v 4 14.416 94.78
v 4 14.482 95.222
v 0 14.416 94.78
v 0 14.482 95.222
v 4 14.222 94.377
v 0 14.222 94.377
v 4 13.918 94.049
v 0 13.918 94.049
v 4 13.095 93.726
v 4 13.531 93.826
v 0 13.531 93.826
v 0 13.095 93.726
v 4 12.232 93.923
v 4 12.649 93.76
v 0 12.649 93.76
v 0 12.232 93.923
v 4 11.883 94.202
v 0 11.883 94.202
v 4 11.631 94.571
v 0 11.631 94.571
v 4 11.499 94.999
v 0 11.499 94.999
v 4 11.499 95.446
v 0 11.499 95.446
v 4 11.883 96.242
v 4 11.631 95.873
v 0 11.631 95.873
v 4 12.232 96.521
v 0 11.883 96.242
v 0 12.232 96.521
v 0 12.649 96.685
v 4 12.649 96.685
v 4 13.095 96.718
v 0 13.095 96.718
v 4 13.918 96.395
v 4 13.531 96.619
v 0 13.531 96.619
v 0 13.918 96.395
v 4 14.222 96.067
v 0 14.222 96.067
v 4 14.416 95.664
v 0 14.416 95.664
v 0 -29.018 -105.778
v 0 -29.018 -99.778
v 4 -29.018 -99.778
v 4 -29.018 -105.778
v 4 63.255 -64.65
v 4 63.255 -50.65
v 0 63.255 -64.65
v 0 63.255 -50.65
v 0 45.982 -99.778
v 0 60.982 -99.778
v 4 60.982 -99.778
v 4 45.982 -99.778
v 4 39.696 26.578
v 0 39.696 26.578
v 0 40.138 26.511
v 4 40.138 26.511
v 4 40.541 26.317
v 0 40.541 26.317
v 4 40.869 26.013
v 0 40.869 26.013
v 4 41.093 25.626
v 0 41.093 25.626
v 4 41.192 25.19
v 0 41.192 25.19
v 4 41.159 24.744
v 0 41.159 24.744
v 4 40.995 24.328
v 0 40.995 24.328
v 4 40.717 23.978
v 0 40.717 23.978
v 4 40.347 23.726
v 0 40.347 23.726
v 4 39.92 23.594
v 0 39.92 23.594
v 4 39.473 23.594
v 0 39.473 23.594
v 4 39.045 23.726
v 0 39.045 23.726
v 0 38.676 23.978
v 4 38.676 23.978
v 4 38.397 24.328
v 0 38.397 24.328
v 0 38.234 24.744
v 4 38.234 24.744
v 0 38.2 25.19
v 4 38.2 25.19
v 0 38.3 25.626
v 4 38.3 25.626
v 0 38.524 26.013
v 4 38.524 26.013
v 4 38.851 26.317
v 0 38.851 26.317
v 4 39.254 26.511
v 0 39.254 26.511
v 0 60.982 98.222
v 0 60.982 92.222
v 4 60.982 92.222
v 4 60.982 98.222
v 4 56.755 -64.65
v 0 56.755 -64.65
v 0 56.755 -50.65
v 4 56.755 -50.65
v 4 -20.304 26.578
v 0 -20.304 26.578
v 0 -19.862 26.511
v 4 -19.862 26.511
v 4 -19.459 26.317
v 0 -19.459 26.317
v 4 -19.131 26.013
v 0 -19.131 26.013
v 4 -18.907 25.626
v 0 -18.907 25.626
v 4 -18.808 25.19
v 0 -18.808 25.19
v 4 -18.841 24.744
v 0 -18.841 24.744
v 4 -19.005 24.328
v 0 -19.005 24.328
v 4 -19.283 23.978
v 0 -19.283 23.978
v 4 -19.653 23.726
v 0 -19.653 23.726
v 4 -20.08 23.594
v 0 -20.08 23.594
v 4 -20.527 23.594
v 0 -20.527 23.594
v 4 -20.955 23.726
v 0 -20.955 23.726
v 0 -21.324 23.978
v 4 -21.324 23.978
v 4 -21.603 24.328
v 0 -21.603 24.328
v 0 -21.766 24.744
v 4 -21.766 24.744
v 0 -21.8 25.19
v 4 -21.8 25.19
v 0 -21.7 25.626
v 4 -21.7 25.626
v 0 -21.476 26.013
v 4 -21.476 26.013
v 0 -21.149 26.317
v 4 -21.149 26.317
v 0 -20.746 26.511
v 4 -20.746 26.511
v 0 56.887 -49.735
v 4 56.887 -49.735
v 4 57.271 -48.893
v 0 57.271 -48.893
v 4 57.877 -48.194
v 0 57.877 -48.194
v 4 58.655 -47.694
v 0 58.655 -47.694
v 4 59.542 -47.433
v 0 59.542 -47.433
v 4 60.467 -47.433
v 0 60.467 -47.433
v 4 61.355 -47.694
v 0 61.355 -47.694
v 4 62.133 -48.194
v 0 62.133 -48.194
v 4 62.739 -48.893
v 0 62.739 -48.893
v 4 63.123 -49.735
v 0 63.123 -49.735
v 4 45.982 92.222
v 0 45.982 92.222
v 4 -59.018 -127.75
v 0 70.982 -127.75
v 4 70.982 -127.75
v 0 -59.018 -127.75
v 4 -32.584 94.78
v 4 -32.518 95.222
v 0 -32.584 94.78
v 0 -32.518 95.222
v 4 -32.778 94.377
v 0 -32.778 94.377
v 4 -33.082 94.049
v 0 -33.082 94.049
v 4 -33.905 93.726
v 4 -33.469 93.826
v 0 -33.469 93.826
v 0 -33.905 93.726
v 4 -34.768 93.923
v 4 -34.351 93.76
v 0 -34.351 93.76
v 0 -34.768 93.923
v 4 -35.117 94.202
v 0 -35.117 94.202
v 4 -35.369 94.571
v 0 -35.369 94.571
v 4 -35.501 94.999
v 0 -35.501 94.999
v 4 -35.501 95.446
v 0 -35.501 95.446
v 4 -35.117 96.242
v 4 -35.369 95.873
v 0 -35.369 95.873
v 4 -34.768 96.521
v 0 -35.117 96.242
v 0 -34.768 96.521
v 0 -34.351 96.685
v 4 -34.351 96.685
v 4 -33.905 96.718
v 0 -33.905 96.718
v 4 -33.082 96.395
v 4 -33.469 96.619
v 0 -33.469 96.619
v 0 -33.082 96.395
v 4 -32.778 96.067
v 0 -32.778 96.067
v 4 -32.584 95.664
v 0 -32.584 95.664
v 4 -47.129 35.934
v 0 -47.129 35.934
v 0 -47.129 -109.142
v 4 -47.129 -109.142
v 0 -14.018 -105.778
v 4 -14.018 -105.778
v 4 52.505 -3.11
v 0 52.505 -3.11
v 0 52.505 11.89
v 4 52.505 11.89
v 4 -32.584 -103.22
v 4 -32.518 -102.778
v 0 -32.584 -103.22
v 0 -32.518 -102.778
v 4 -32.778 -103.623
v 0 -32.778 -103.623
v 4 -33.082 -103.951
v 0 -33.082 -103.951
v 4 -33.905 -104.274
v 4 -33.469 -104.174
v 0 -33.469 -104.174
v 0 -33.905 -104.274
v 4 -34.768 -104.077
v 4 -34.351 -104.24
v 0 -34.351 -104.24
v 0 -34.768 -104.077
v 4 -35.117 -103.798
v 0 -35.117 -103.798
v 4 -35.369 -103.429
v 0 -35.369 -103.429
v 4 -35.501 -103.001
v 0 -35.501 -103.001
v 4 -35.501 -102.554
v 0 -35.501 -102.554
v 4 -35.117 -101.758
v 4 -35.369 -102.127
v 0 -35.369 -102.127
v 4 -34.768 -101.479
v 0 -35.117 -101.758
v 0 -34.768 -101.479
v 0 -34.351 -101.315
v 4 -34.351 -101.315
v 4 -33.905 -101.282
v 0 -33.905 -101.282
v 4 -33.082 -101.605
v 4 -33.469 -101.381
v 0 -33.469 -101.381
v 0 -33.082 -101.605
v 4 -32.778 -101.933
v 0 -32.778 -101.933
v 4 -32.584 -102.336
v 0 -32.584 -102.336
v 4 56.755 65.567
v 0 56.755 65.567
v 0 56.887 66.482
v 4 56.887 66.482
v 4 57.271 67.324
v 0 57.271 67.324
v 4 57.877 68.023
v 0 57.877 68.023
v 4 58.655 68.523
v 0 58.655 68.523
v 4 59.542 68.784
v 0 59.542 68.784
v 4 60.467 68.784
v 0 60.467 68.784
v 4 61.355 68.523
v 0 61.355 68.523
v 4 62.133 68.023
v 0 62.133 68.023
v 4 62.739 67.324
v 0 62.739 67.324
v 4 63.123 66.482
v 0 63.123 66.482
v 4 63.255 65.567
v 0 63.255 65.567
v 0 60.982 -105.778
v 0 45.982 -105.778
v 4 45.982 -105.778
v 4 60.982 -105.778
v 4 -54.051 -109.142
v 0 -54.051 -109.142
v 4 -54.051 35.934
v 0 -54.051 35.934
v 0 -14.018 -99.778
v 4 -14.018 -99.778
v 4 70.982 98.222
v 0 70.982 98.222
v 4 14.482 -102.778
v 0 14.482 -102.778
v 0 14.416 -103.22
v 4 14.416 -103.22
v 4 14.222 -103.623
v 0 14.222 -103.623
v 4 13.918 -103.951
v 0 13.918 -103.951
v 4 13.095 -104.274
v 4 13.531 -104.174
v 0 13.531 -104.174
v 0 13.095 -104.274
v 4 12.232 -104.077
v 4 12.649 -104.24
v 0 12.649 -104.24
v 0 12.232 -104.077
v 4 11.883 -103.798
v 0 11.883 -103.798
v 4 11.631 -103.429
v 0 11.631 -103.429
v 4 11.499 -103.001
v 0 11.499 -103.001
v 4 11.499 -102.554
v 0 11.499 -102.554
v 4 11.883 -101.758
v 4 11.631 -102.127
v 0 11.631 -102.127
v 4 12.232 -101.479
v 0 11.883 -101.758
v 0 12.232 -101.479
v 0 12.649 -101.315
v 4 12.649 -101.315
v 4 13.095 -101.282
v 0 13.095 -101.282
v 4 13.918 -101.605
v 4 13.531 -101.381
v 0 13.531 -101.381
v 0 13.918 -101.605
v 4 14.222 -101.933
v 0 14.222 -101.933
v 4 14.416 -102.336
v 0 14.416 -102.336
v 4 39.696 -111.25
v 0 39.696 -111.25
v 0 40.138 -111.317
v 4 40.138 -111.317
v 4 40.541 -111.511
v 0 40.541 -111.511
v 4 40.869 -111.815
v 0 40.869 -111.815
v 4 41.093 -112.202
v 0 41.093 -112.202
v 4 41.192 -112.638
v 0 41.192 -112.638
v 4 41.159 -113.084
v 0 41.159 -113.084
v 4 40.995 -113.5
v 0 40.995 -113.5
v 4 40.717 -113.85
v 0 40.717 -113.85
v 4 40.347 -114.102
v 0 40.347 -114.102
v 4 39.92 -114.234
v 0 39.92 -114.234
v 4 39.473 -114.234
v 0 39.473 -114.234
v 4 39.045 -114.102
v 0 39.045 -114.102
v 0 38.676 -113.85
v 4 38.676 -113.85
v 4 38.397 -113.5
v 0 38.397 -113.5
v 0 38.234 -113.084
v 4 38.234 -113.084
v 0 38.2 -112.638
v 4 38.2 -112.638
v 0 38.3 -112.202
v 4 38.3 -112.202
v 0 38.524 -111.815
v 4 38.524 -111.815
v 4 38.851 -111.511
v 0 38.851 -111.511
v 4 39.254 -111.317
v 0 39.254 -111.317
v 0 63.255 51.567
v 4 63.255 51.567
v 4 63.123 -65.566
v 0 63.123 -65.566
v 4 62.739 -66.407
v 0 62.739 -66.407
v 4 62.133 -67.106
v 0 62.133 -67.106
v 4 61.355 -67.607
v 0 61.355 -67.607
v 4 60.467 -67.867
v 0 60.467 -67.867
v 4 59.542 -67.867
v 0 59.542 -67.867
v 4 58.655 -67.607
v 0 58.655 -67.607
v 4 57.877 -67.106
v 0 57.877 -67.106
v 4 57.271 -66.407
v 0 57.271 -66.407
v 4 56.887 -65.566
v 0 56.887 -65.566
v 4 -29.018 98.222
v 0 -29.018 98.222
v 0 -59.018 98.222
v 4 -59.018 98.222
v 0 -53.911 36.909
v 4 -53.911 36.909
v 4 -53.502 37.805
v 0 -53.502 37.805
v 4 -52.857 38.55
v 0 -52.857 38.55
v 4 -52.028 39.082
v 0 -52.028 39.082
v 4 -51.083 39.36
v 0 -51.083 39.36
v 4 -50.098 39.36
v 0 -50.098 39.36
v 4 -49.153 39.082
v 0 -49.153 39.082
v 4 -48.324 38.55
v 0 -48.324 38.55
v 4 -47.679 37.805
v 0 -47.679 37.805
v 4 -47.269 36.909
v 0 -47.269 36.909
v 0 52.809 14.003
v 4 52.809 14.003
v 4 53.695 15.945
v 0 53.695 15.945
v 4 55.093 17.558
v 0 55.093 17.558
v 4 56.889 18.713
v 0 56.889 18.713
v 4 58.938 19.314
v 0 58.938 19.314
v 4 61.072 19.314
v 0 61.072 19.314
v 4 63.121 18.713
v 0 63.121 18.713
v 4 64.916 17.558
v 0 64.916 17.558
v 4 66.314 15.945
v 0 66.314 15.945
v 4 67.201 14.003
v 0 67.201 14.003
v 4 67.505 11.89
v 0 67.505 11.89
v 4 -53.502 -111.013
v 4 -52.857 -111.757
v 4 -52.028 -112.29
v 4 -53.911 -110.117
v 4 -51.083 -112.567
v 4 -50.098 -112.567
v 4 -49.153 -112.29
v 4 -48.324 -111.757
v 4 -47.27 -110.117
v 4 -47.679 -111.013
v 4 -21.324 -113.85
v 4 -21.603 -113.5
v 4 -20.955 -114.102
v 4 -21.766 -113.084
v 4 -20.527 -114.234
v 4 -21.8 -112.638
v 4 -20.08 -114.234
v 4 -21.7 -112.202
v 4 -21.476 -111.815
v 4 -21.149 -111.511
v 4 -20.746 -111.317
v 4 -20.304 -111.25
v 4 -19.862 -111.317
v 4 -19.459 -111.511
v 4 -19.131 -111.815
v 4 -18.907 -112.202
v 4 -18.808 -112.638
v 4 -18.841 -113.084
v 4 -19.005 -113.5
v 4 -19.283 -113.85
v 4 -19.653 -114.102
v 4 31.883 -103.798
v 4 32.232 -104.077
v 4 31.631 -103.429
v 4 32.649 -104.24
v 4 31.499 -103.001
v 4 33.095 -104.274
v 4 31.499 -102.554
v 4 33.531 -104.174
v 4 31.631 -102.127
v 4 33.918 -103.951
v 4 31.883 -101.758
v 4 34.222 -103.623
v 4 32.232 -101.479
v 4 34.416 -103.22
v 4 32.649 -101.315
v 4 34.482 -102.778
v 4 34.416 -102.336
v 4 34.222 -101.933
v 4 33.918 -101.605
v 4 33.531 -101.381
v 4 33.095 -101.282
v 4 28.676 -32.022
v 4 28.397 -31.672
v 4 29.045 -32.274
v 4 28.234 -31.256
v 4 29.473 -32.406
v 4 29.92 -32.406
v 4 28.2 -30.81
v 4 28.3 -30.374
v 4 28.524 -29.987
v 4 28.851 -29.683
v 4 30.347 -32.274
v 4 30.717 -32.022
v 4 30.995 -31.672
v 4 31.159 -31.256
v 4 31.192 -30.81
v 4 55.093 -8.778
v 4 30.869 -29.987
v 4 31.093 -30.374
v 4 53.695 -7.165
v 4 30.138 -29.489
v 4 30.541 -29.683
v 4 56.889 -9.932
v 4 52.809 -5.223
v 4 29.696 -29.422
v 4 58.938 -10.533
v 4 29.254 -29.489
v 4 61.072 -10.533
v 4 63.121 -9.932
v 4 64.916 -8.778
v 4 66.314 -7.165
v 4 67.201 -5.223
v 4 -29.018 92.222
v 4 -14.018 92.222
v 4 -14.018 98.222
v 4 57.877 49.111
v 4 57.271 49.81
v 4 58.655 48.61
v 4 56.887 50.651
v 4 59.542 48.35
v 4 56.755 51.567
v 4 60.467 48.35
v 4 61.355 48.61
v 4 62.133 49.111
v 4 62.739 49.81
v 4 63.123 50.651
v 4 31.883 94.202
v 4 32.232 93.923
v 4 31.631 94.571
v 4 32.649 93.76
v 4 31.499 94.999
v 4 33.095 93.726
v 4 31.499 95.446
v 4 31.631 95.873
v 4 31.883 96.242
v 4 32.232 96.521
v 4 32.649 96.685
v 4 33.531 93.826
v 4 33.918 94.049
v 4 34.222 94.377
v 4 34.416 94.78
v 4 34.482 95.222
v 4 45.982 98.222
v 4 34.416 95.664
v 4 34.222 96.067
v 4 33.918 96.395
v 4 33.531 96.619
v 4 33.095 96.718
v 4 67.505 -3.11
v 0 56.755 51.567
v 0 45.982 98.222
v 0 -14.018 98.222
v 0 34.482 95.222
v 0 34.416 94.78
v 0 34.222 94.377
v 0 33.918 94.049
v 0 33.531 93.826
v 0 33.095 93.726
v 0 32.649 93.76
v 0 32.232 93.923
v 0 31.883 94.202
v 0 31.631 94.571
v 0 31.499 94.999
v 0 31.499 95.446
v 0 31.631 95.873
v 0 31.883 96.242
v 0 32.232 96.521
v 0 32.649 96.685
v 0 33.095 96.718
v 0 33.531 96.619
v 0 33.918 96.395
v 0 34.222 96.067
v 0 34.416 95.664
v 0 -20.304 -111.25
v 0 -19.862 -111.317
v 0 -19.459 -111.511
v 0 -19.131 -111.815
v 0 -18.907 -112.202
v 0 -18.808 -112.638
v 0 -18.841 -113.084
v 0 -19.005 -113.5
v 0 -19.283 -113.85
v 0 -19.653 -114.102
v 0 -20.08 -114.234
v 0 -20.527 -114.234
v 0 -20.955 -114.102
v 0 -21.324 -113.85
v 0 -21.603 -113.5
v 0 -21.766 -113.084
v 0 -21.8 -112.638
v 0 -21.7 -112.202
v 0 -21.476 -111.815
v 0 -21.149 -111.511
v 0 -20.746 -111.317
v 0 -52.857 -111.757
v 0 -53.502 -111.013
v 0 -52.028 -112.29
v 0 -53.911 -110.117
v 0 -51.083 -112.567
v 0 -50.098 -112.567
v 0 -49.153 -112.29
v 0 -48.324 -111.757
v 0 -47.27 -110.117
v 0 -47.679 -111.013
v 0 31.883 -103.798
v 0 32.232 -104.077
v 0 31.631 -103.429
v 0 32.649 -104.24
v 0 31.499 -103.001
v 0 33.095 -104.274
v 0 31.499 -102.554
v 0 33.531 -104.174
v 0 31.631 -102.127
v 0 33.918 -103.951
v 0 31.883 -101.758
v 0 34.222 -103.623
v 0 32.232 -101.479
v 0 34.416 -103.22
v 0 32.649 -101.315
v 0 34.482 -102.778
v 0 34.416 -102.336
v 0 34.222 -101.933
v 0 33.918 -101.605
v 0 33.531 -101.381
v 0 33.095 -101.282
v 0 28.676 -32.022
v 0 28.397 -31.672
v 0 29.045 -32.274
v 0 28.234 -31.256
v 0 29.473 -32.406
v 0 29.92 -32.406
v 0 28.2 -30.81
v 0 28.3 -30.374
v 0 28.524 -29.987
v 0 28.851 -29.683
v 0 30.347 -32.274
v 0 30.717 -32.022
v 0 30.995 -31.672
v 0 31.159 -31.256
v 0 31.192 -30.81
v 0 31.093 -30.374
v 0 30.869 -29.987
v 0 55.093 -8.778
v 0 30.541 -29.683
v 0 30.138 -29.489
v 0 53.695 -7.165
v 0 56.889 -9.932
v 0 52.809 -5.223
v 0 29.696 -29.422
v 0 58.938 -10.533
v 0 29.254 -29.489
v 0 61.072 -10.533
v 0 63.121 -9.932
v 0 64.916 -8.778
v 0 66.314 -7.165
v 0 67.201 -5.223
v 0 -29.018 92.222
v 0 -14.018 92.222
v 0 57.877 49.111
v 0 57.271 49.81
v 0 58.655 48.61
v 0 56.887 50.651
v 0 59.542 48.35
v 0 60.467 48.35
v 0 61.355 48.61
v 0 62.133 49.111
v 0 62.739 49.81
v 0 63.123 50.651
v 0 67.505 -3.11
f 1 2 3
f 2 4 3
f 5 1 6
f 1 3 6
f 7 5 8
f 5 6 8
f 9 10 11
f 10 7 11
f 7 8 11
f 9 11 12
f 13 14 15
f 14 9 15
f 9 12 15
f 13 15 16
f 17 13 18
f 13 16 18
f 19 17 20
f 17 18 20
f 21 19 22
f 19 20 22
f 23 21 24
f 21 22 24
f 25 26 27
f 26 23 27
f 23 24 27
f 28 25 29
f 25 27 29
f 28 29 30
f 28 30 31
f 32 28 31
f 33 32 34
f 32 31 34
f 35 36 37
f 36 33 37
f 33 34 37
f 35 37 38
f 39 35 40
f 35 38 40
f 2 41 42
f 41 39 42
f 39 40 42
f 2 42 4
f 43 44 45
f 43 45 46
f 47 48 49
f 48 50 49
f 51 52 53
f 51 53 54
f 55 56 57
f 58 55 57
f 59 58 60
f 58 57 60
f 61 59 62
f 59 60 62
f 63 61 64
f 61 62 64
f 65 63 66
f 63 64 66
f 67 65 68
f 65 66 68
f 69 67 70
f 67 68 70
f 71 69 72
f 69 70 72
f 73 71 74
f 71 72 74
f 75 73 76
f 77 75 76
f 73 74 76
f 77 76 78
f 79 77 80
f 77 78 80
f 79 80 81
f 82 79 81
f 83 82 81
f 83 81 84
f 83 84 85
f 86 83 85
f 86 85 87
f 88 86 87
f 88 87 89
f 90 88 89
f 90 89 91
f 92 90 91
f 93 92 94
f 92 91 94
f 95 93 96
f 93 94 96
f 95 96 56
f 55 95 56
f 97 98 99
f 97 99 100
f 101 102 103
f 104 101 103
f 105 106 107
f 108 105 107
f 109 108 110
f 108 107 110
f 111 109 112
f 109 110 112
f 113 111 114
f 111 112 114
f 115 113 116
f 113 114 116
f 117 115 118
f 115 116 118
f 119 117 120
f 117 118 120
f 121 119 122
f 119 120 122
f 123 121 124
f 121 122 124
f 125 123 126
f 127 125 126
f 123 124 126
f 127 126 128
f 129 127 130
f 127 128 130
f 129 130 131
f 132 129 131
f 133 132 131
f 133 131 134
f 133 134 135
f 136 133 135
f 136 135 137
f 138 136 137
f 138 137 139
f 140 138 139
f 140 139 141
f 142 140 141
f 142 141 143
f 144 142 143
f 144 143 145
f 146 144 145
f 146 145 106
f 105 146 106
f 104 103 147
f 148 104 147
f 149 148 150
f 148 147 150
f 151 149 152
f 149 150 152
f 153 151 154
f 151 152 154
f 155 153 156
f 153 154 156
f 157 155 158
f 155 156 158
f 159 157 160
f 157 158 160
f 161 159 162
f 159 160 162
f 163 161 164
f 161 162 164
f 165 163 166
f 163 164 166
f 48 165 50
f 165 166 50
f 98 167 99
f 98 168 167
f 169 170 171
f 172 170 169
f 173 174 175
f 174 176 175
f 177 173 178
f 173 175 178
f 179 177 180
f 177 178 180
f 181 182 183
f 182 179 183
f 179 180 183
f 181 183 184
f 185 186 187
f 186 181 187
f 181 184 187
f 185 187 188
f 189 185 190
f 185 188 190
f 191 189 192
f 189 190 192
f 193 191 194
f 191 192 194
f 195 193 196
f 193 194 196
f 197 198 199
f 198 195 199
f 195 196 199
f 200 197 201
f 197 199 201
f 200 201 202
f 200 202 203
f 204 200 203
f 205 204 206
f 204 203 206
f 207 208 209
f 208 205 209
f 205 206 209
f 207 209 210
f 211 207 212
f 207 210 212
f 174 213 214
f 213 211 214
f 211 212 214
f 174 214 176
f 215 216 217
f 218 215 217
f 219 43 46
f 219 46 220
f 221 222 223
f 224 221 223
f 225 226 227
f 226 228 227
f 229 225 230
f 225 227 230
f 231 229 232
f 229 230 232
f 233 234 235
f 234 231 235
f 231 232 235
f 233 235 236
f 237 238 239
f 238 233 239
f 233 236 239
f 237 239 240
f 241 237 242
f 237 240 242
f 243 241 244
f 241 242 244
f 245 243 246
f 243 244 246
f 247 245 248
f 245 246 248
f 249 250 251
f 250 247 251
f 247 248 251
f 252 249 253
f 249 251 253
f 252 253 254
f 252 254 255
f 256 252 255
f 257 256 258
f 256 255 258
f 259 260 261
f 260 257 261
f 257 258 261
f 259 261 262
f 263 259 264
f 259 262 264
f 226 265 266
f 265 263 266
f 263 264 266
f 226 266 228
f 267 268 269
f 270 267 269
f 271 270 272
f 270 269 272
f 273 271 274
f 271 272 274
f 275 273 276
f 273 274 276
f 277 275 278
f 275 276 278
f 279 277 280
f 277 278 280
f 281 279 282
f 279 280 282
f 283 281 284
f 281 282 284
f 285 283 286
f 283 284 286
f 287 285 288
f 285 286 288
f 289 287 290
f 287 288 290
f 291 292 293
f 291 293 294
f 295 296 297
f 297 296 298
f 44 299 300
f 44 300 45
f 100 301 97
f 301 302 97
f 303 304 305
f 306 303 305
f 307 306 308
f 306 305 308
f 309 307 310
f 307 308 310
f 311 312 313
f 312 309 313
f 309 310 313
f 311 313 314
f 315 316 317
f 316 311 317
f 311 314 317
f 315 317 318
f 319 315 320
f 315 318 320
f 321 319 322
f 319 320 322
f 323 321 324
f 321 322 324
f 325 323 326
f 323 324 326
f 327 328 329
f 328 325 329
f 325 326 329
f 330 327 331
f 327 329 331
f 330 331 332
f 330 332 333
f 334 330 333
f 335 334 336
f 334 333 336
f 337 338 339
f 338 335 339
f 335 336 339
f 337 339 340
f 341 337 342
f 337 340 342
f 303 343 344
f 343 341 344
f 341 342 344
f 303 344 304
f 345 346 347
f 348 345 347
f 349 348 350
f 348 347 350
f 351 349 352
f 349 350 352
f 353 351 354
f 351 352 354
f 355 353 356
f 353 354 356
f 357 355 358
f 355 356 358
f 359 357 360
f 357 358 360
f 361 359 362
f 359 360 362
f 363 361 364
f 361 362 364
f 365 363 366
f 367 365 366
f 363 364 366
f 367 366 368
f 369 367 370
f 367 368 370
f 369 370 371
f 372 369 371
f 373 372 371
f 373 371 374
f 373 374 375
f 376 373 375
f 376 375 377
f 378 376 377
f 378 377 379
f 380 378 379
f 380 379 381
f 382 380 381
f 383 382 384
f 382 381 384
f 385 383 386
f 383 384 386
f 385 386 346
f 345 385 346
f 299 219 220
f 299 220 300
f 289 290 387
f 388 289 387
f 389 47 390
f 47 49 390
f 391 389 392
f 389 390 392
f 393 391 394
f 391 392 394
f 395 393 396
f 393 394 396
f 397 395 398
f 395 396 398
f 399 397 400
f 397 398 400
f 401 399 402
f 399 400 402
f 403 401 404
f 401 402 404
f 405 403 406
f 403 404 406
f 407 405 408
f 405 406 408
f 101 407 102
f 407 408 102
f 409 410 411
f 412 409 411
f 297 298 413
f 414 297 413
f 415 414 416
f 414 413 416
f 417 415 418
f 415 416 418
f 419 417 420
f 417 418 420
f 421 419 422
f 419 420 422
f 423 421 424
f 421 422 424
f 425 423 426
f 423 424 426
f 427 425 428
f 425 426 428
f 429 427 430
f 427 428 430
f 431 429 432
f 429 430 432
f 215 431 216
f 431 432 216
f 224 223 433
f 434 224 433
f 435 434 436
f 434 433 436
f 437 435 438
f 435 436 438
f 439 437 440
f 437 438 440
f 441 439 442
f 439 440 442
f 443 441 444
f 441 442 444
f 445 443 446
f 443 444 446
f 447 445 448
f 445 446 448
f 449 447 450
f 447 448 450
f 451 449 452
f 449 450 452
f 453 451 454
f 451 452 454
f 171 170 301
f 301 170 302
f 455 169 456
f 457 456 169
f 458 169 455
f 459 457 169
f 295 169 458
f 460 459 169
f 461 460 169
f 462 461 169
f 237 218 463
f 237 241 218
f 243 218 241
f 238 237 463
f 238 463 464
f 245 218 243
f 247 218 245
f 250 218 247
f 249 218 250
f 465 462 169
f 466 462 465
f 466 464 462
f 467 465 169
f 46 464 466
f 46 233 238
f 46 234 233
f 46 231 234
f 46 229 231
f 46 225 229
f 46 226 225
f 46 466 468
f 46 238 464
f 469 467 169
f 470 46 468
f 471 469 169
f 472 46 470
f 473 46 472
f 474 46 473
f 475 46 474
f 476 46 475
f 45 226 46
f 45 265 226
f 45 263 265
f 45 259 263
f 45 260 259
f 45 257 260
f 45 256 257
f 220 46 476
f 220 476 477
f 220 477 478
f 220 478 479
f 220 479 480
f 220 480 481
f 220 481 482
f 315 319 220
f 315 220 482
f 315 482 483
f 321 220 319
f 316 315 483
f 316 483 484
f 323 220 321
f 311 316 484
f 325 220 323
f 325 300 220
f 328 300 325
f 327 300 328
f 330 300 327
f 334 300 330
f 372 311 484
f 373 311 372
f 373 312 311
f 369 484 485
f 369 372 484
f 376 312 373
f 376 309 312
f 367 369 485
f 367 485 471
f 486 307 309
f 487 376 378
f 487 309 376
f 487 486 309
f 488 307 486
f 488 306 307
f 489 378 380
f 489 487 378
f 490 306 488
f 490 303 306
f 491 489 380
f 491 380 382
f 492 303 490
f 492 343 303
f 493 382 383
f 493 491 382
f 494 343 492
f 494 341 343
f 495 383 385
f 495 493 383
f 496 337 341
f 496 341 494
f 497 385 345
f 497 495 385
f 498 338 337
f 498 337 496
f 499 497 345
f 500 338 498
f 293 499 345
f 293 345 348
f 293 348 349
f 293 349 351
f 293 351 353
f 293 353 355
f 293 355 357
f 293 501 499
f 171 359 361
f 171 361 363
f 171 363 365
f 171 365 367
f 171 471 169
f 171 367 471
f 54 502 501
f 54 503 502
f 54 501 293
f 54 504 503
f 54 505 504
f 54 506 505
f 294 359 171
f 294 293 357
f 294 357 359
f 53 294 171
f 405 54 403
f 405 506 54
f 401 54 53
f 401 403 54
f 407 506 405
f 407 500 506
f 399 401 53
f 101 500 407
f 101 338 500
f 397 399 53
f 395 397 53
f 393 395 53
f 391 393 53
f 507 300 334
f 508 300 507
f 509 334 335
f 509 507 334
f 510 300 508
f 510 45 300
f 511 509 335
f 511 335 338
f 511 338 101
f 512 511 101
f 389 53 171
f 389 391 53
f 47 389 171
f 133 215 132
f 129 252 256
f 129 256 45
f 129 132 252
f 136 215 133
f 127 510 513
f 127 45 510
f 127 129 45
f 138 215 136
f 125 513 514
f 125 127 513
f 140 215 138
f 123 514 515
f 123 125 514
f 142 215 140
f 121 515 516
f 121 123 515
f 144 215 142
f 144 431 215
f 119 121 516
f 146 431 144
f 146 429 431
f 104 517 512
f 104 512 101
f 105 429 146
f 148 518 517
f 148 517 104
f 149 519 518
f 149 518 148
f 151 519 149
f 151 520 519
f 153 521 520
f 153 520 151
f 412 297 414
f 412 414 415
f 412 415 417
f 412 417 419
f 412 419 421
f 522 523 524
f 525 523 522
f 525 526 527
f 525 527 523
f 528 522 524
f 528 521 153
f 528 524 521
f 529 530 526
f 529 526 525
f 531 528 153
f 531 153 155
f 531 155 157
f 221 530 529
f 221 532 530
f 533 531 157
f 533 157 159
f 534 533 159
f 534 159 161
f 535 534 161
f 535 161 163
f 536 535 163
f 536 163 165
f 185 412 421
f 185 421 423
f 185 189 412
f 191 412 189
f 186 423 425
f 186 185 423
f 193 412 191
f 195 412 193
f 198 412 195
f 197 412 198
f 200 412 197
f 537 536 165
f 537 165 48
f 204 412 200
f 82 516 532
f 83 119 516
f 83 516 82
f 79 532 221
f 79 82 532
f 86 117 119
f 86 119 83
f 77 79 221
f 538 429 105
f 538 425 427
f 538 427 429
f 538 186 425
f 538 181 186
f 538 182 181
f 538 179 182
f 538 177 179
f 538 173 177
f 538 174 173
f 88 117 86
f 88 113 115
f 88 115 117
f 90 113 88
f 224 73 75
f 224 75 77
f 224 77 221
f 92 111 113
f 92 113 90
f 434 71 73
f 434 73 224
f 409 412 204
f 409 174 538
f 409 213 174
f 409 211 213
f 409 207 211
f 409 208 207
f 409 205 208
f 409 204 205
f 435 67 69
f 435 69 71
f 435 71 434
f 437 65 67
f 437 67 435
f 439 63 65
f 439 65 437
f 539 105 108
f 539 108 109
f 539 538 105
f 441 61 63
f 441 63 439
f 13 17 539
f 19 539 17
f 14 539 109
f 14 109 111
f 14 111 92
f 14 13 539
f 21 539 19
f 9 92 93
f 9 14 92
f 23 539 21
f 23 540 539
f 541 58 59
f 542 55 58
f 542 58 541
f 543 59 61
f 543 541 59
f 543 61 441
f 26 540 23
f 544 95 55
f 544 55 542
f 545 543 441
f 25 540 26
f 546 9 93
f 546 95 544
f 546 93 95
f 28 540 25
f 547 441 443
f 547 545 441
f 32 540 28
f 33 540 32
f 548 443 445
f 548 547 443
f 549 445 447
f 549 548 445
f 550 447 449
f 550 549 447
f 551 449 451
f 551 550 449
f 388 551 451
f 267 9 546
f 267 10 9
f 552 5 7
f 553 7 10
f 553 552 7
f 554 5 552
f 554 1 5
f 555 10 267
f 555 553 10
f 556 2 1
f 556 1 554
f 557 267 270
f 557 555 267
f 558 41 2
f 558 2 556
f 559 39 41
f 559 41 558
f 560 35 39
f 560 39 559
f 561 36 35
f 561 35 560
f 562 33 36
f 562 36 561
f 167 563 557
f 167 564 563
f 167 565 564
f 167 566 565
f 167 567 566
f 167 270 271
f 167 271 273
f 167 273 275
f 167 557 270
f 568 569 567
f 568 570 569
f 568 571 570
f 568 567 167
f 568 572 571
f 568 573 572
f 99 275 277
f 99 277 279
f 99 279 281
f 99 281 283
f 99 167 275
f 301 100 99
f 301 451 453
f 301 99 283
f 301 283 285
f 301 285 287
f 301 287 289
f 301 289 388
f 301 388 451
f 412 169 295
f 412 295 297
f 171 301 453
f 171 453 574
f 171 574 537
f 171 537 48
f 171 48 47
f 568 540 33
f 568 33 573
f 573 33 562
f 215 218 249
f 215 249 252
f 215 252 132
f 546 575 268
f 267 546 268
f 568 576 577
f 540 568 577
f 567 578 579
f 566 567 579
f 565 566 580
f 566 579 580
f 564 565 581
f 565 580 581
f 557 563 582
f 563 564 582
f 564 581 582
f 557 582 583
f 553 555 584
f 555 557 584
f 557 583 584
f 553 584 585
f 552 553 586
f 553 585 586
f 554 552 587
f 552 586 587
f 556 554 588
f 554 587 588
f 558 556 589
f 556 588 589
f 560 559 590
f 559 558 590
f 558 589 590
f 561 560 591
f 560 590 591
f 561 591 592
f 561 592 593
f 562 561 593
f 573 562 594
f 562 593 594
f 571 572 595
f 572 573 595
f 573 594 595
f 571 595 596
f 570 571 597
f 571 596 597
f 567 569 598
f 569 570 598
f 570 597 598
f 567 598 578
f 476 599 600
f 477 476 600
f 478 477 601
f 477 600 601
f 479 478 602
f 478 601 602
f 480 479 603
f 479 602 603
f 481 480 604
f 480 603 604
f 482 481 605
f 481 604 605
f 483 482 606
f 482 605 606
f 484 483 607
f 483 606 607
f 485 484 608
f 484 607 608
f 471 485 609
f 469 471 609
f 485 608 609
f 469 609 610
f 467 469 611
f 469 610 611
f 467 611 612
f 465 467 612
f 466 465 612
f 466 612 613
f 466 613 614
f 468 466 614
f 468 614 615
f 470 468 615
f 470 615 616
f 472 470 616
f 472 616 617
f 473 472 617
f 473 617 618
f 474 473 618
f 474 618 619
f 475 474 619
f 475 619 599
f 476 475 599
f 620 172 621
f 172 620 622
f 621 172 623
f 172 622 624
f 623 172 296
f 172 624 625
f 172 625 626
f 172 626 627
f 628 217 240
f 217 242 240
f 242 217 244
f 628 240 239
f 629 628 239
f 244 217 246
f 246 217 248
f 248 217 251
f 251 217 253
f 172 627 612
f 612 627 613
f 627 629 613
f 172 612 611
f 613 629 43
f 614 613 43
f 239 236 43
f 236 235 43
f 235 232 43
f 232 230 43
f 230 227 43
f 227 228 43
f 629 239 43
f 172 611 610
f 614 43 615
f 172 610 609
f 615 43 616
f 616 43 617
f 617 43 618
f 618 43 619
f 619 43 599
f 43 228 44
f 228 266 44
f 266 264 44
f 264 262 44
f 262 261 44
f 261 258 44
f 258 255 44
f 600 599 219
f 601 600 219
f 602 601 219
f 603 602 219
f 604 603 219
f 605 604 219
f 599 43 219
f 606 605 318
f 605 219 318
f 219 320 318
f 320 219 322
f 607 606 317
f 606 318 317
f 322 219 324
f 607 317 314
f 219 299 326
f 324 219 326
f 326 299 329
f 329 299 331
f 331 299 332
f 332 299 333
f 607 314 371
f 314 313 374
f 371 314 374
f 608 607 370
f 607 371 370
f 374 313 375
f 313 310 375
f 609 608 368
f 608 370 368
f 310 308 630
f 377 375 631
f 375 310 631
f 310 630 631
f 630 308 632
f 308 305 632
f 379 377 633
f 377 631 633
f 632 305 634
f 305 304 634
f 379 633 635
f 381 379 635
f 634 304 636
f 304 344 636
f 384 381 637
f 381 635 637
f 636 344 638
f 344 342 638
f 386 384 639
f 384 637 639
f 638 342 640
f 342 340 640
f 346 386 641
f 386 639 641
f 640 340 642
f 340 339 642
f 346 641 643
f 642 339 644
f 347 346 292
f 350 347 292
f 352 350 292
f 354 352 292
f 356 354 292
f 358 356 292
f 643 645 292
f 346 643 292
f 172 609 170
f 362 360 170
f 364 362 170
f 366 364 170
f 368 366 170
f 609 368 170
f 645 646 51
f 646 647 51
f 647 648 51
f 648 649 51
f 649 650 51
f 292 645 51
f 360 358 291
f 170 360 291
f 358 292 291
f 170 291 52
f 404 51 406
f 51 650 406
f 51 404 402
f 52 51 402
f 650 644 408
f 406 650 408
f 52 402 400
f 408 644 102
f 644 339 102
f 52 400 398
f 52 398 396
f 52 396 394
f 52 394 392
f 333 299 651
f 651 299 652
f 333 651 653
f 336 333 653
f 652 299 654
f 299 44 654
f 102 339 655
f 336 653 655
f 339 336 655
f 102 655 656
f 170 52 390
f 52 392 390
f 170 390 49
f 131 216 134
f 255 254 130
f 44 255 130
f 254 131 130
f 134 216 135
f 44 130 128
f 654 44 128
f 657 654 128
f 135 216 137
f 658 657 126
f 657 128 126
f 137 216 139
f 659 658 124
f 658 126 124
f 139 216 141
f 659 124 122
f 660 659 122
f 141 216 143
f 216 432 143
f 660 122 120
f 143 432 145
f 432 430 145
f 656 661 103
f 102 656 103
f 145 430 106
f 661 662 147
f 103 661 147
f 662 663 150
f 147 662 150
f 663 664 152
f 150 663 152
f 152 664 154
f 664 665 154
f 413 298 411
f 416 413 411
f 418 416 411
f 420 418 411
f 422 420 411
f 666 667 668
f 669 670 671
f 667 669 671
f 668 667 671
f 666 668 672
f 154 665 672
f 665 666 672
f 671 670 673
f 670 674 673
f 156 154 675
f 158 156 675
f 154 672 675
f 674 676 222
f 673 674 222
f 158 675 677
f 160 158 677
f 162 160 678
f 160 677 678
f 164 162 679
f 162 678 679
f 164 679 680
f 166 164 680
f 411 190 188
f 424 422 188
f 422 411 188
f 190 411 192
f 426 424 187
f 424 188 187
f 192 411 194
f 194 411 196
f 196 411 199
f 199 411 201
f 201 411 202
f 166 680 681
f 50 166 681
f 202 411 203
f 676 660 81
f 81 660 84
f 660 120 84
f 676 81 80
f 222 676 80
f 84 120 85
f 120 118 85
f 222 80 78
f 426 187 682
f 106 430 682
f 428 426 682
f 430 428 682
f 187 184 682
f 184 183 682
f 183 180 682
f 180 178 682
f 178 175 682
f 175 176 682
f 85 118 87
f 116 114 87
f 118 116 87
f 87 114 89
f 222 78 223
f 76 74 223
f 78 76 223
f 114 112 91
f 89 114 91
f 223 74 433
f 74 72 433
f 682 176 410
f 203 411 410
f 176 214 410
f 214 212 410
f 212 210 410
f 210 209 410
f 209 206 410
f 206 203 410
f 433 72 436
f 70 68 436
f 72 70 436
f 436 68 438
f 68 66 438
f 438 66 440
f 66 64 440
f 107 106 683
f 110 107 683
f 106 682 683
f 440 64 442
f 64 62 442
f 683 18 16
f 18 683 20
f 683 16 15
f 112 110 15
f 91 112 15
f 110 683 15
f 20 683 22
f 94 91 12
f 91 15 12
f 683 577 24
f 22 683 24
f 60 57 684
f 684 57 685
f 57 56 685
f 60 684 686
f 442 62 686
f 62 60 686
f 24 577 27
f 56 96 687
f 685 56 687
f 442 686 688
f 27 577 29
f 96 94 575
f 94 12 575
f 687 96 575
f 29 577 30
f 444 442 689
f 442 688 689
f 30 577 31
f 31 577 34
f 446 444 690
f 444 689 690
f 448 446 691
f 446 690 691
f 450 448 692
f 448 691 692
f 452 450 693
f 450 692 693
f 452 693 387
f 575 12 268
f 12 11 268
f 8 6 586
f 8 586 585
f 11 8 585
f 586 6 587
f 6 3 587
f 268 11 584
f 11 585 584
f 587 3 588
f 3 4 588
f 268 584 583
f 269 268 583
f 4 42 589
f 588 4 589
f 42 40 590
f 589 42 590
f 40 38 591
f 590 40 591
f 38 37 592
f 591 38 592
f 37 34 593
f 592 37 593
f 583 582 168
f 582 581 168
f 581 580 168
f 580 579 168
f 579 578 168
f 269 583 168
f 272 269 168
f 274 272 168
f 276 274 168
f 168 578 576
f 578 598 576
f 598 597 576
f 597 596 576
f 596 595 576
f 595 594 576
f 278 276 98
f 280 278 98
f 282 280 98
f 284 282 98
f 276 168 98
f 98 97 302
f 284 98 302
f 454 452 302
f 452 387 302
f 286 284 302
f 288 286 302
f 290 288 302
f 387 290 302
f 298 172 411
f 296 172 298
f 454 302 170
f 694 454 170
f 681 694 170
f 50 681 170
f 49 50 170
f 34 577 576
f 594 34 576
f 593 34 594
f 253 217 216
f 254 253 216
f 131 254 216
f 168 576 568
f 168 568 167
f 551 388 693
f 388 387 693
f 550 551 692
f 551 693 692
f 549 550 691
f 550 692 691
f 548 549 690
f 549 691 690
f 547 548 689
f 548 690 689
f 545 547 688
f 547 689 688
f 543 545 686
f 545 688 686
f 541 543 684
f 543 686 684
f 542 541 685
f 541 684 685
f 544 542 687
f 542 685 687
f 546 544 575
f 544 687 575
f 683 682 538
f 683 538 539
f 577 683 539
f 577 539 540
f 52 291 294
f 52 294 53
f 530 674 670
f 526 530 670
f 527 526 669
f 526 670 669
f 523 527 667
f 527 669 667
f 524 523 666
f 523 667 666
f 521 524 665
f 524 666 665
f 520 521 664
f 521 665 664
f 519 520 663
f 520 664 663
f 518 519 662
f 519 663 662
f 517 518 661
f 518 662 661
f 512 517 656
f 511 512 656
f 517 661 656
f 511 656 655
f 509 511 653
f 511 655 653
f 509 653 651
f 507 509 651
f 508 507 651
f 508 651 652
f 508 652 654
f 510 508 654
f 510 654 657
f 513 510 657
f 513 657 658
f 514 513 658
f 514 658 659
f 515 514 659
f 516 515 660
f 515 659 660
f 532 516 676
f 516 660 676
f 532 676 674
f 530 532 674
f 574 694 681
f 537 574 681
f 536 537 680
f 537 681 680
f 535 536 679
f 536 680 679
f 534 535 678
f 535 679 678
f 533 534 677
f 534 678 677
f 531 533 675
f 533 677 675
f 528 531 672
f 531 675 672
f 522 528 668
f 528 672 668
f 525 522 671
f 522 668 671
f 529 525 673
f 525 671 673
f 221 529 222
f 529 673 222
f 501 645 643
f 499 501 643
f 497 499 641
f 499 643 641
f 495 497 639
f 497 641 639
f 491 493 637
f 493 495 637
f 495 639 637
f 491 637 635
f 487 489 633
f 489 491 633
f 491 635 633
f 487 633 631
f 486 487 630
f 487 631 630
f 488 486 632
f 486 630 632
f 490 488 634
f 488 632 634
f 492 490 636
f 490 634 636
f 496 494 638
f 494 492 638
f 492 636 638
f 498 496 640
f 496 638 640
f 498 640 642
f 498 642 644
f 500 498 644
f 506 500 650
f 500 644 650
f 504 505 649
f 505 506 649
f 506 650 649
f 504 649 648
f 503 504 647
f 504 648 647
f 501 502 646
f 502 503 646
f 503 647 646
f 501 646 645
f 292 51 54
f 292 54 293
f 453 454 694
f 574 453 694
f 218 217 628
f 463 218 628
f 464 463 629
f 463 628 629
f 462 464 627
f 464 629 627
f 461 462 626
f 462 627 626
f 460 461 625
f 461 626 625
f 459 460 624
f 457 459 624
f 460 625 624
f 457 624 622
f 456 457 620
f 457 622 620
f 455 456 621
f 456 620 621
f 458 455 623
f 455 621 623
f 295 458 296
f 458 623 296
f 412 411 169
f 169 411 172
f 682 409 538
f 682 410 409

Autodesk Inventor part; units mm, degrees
ref_plane "YZ Plane" through (0, 0, 0) normal (1, 0, 0) x (0, 1, 0)
ref_plane "XZ Plane" through (0, 0, 0) normal (0, 1, 0) x (-1, 0, 0)
ref_plane "XY Plane" through (0, 0, 0) normal (0, 0, 1) x (1, 0, 0)
sketch "Эскиз1" plane through (0, 0, 0) normal (1, 0, 0) x (0, 1, 0)
  line L0 (70.9825, 98.2222) -> (-59.0175, 98.2222)
  line L1 (-59.0175, 98.2222) -> (-59.0175, -105.7778)
  line L2 (-59.0175, -105.7778) -> (70.9825, -105.7778)
  line L3 (70.9825, -105.7778) -> (70.9825, 98.2222)
  circle A0 centre (-34.0175, 95.2222) radius 1.5
  circle A1 centre (-34.0175, -102.7778) radius 1.5
  circle A2 centre (12.9825, 95.2222) radius 1.5
  circle A3 centre (12.9825, -102.7778) radius 1.5
  circle A4 centre (32.9825, 95.2222) radius 1.5
  circle A5 centre (32.9825, -102.7778) radius 1.5
  line L4 (-59.0175, -105.7778) -> (70.9825, -105.7778)
  line L5 (70.9825, -105.7778) -> (70.9825, -127.7504)
  line L6 (70.9825, -127.7504) -> (-59.0175, -127.7504)
  line L7 (-59.0175, -127.7504) -> (-59.0175, -105.7778)
  point P0 (0, 0)
  dimension "d0" = 204
  dimension "d1" = 130
  dimension "d2" = 3
  dimension "d3" = 25
  dimension "d4" = 25
  dimension "d5" = 3
  dimension "d6" = 3
  dimension "d7" = 3
  dimension "d8" = 72
  dimension "d9" = 3
  dimension "d10" = 3
  dimension "d11" = 3
  dimension "d12" = 72
  dimension "d13" = 3
  dimension "d14" = 3
  dimension "d15" = 20
  dimension "d16" = 3
  dimension "d17" = 3
  dimension "d18" = 20
extrude "Выдавливание1" add sketch "Эскиз1" along normal blind 4
sketch "Эскиз2" plane through (0, 0, 0) normal (-1, 0, 0) x (0, 0, 1)
  circle A0 centre (-112.7504, -20.3037) radius 1.5
  circle A1 centre (25.0776, -20.3037) radius 1.5
  line L0 (98.2222, -59.0175) -> (-105.7778, -59.0175) projected
  circle A2 centre (-112.7504, 39.6963) radius 1.5
  circle A3 centre (25.0776, 39.6963) radius 1.5
  line L1 (98.2222, 70.9825) -> (98.2222, -59.0175) projected
  circle A4 centre (-102.7778, 12.9825) radius 1.5 projected
  line L2 (-105.7778, -59.0175) -> (-105.7778, 70.9825) projected
  line L3 (-105.7778, 70.9825) -> (98.2222, 70.9825) projected
  line L4 (-127.7504, -59.0175) -> (-127.7504, 70.9825) projected
  circle A5 centre (-30.9224, 29.6963) radius 1.5
  point P0 (0, 0)
  point P1 (98.2222, 5.9825)
  dimension "d21" = 137.828
  dimension "d22" = 3
  dimension "d23" = 3
  dimension "d26" = 3
  dimension "d27" = 3
  dimension "d28" = 137.828
  dimension "d29" = 60
  dimension "d30" = 60
  dimension "d37" = 31.2861
  dimension "d38" = 31.2861
  dimension "d47" = 15
  dimension "d48" = 15
  dimension "d49" = 3
  dimension "d50" = 10
  dimension "d51" = 56
extrude "Выдавливание2" cut sketch "Эскиз2" against normal blind 5 contours A0 | A1 | A2 | A3 | A5
sketch "Эскиз3" plane through (0, 0, 0) normal (-1, 0, 0) x (0, 0, 1)
  line L0 (11.8903, 60.0049) -> (-3.1097, 60.0049) construction
  line L1 (11.8903, 67.5049) -> (-3.1097, 67.5049)
  line L2 (-3.1097, 52.5049) -> (11.8903, 52.5049)
  arc A0 (11.8903, 52.5049) -> (11.8903, 67.5049) centre (11.8903, 60.0049) ccw
  arc A1 (-3.1097, 67.5049) -> (-3.1097, 52.5049) centre (-3.1097, 60.0049) ccw
  line L3 (65.5667, 60.0049) -> (51.5667, 60.0049) construction
  line L4 (65.5667, 63.2549) -> (51.5667, 63.2549)
  line L5 (51.5667, 56.7549) -> (65.5667, 56.7549)
  arc A2 (65.5667, 56.7549) -> (65.5667, 63.2549) centre (65.5667, 60.0049) ccw
  arc A3 (51.5667, 63.2549) -> (51.5667, 56.7549) centre (51.5667, 60.0049) ccw
  line L6 (-50.6502, 60.0049) -> (-64.6502, 60.0049) construction
  line L7 (-50.6502, 63.2549) -> (-64.6502, 63.2549)
  line L8 (-64.6502, 56.7549) -> (-50.6502, 56.7549)
  arc A4 (-50.6502, 56.7549) -> (-50.6502, 63.2549) centre (-50.6502, 60.0049) ccw
  arc A5 (-64.6502, 63.2549) -> (-64.6502, 56.7549) centre (-64.6502, 60.0049) ccw
  line L9 (35.934, -50.5903) -> (-109.1416, -50.5903) construction
  line L10 (35.934, -47.1293) -> (-109.1416, -47.1293)
  line L11 (-109.1416, -54.0514) -> (35.934, -54.0514)
  arc A6 (35.934, -54.0514) -> (35.934, -47.1293) centre (35.934, -50.5903) ccw
  arc A7 (-109.1416, -47.1293) -> (-109.1416, -54.0514) centre (-109.1416, -50.5903) ccw
  point P0 (0, 0)
  point P1 (4.3903, 60.0049)
  point P2 (58.5667, 60.0049)
  point P3 (-57.6502, 60.0049)
  point P4 (-36.6038, -50.5903)
  dimension "d39" = 14
  dimension "d40" = 14
  dimension "d41" = 6.5
  dimension "d42" = 6.5
  dimension "d43" = 15
  dimension "d44" = 15
extrude "Выдавливание3" cut sketch "Эскиз3" against normal through all
sketch "Эскиз4" plane through (0, 0, 0) normal (-1, 0, 0) x (0, 0, 1)
  point P0 (0, 0)
sketch "Эскиз5" plane through (0, 0, 0) normal (-1, 0, 0) x (0, 0, 1)
  line L0 (-105.7778, -14.0175) -> (-99.7778, -14.0175)
  line L1 (-99.7778, -14.0175) -> (-99.7778, -29.0175)
  line L2 (-99.7778, -29.0175) -> (-105.7778, -29.0175)
  line L3 (-105.7778, -29.0175) -> (-105.7778, -14.0175)
  line L4 (-105.7778, 60.9825) -> (-99.7778, 60.9825)
  line L5 (-99.7778, 60.9825) -> (-99.7778, 45.9825)
  line L6 (-99.7778, 45.9825) -> (-105.7778, 45.9825)
  line L7 (-105.7778, 45.9825) -> (-105.7778, 60.9825)
  line L8 (92.2222, -14.0175) -> (98.2222, -14.0175)
  line L9 (98.2222, -14.0175) -> (98.2222, -29.0175)
  line L10 (98.2222, -29.0175) -> (92.2222, -29.0175)
  line L11 (92.2222, -29.0175) -> (92.2222, -14.0175)
  line L12 (92.2222, 60.9825) -> (98.2222, 60.9825)
  line L13 (98.2222, 60.9825) -> (98.2222, 45.9825)
  line L14 (98.2222, 45.9825) -> (92.2222, 45.9825)
  line L15 (92.2222, 45.9825) -> (92.2222, 60.9825)
  point P0 (0, 0)
extrude "Выдавливание4" cut sketch "Эскиз5" against normal through all
properties part number "крышка"
